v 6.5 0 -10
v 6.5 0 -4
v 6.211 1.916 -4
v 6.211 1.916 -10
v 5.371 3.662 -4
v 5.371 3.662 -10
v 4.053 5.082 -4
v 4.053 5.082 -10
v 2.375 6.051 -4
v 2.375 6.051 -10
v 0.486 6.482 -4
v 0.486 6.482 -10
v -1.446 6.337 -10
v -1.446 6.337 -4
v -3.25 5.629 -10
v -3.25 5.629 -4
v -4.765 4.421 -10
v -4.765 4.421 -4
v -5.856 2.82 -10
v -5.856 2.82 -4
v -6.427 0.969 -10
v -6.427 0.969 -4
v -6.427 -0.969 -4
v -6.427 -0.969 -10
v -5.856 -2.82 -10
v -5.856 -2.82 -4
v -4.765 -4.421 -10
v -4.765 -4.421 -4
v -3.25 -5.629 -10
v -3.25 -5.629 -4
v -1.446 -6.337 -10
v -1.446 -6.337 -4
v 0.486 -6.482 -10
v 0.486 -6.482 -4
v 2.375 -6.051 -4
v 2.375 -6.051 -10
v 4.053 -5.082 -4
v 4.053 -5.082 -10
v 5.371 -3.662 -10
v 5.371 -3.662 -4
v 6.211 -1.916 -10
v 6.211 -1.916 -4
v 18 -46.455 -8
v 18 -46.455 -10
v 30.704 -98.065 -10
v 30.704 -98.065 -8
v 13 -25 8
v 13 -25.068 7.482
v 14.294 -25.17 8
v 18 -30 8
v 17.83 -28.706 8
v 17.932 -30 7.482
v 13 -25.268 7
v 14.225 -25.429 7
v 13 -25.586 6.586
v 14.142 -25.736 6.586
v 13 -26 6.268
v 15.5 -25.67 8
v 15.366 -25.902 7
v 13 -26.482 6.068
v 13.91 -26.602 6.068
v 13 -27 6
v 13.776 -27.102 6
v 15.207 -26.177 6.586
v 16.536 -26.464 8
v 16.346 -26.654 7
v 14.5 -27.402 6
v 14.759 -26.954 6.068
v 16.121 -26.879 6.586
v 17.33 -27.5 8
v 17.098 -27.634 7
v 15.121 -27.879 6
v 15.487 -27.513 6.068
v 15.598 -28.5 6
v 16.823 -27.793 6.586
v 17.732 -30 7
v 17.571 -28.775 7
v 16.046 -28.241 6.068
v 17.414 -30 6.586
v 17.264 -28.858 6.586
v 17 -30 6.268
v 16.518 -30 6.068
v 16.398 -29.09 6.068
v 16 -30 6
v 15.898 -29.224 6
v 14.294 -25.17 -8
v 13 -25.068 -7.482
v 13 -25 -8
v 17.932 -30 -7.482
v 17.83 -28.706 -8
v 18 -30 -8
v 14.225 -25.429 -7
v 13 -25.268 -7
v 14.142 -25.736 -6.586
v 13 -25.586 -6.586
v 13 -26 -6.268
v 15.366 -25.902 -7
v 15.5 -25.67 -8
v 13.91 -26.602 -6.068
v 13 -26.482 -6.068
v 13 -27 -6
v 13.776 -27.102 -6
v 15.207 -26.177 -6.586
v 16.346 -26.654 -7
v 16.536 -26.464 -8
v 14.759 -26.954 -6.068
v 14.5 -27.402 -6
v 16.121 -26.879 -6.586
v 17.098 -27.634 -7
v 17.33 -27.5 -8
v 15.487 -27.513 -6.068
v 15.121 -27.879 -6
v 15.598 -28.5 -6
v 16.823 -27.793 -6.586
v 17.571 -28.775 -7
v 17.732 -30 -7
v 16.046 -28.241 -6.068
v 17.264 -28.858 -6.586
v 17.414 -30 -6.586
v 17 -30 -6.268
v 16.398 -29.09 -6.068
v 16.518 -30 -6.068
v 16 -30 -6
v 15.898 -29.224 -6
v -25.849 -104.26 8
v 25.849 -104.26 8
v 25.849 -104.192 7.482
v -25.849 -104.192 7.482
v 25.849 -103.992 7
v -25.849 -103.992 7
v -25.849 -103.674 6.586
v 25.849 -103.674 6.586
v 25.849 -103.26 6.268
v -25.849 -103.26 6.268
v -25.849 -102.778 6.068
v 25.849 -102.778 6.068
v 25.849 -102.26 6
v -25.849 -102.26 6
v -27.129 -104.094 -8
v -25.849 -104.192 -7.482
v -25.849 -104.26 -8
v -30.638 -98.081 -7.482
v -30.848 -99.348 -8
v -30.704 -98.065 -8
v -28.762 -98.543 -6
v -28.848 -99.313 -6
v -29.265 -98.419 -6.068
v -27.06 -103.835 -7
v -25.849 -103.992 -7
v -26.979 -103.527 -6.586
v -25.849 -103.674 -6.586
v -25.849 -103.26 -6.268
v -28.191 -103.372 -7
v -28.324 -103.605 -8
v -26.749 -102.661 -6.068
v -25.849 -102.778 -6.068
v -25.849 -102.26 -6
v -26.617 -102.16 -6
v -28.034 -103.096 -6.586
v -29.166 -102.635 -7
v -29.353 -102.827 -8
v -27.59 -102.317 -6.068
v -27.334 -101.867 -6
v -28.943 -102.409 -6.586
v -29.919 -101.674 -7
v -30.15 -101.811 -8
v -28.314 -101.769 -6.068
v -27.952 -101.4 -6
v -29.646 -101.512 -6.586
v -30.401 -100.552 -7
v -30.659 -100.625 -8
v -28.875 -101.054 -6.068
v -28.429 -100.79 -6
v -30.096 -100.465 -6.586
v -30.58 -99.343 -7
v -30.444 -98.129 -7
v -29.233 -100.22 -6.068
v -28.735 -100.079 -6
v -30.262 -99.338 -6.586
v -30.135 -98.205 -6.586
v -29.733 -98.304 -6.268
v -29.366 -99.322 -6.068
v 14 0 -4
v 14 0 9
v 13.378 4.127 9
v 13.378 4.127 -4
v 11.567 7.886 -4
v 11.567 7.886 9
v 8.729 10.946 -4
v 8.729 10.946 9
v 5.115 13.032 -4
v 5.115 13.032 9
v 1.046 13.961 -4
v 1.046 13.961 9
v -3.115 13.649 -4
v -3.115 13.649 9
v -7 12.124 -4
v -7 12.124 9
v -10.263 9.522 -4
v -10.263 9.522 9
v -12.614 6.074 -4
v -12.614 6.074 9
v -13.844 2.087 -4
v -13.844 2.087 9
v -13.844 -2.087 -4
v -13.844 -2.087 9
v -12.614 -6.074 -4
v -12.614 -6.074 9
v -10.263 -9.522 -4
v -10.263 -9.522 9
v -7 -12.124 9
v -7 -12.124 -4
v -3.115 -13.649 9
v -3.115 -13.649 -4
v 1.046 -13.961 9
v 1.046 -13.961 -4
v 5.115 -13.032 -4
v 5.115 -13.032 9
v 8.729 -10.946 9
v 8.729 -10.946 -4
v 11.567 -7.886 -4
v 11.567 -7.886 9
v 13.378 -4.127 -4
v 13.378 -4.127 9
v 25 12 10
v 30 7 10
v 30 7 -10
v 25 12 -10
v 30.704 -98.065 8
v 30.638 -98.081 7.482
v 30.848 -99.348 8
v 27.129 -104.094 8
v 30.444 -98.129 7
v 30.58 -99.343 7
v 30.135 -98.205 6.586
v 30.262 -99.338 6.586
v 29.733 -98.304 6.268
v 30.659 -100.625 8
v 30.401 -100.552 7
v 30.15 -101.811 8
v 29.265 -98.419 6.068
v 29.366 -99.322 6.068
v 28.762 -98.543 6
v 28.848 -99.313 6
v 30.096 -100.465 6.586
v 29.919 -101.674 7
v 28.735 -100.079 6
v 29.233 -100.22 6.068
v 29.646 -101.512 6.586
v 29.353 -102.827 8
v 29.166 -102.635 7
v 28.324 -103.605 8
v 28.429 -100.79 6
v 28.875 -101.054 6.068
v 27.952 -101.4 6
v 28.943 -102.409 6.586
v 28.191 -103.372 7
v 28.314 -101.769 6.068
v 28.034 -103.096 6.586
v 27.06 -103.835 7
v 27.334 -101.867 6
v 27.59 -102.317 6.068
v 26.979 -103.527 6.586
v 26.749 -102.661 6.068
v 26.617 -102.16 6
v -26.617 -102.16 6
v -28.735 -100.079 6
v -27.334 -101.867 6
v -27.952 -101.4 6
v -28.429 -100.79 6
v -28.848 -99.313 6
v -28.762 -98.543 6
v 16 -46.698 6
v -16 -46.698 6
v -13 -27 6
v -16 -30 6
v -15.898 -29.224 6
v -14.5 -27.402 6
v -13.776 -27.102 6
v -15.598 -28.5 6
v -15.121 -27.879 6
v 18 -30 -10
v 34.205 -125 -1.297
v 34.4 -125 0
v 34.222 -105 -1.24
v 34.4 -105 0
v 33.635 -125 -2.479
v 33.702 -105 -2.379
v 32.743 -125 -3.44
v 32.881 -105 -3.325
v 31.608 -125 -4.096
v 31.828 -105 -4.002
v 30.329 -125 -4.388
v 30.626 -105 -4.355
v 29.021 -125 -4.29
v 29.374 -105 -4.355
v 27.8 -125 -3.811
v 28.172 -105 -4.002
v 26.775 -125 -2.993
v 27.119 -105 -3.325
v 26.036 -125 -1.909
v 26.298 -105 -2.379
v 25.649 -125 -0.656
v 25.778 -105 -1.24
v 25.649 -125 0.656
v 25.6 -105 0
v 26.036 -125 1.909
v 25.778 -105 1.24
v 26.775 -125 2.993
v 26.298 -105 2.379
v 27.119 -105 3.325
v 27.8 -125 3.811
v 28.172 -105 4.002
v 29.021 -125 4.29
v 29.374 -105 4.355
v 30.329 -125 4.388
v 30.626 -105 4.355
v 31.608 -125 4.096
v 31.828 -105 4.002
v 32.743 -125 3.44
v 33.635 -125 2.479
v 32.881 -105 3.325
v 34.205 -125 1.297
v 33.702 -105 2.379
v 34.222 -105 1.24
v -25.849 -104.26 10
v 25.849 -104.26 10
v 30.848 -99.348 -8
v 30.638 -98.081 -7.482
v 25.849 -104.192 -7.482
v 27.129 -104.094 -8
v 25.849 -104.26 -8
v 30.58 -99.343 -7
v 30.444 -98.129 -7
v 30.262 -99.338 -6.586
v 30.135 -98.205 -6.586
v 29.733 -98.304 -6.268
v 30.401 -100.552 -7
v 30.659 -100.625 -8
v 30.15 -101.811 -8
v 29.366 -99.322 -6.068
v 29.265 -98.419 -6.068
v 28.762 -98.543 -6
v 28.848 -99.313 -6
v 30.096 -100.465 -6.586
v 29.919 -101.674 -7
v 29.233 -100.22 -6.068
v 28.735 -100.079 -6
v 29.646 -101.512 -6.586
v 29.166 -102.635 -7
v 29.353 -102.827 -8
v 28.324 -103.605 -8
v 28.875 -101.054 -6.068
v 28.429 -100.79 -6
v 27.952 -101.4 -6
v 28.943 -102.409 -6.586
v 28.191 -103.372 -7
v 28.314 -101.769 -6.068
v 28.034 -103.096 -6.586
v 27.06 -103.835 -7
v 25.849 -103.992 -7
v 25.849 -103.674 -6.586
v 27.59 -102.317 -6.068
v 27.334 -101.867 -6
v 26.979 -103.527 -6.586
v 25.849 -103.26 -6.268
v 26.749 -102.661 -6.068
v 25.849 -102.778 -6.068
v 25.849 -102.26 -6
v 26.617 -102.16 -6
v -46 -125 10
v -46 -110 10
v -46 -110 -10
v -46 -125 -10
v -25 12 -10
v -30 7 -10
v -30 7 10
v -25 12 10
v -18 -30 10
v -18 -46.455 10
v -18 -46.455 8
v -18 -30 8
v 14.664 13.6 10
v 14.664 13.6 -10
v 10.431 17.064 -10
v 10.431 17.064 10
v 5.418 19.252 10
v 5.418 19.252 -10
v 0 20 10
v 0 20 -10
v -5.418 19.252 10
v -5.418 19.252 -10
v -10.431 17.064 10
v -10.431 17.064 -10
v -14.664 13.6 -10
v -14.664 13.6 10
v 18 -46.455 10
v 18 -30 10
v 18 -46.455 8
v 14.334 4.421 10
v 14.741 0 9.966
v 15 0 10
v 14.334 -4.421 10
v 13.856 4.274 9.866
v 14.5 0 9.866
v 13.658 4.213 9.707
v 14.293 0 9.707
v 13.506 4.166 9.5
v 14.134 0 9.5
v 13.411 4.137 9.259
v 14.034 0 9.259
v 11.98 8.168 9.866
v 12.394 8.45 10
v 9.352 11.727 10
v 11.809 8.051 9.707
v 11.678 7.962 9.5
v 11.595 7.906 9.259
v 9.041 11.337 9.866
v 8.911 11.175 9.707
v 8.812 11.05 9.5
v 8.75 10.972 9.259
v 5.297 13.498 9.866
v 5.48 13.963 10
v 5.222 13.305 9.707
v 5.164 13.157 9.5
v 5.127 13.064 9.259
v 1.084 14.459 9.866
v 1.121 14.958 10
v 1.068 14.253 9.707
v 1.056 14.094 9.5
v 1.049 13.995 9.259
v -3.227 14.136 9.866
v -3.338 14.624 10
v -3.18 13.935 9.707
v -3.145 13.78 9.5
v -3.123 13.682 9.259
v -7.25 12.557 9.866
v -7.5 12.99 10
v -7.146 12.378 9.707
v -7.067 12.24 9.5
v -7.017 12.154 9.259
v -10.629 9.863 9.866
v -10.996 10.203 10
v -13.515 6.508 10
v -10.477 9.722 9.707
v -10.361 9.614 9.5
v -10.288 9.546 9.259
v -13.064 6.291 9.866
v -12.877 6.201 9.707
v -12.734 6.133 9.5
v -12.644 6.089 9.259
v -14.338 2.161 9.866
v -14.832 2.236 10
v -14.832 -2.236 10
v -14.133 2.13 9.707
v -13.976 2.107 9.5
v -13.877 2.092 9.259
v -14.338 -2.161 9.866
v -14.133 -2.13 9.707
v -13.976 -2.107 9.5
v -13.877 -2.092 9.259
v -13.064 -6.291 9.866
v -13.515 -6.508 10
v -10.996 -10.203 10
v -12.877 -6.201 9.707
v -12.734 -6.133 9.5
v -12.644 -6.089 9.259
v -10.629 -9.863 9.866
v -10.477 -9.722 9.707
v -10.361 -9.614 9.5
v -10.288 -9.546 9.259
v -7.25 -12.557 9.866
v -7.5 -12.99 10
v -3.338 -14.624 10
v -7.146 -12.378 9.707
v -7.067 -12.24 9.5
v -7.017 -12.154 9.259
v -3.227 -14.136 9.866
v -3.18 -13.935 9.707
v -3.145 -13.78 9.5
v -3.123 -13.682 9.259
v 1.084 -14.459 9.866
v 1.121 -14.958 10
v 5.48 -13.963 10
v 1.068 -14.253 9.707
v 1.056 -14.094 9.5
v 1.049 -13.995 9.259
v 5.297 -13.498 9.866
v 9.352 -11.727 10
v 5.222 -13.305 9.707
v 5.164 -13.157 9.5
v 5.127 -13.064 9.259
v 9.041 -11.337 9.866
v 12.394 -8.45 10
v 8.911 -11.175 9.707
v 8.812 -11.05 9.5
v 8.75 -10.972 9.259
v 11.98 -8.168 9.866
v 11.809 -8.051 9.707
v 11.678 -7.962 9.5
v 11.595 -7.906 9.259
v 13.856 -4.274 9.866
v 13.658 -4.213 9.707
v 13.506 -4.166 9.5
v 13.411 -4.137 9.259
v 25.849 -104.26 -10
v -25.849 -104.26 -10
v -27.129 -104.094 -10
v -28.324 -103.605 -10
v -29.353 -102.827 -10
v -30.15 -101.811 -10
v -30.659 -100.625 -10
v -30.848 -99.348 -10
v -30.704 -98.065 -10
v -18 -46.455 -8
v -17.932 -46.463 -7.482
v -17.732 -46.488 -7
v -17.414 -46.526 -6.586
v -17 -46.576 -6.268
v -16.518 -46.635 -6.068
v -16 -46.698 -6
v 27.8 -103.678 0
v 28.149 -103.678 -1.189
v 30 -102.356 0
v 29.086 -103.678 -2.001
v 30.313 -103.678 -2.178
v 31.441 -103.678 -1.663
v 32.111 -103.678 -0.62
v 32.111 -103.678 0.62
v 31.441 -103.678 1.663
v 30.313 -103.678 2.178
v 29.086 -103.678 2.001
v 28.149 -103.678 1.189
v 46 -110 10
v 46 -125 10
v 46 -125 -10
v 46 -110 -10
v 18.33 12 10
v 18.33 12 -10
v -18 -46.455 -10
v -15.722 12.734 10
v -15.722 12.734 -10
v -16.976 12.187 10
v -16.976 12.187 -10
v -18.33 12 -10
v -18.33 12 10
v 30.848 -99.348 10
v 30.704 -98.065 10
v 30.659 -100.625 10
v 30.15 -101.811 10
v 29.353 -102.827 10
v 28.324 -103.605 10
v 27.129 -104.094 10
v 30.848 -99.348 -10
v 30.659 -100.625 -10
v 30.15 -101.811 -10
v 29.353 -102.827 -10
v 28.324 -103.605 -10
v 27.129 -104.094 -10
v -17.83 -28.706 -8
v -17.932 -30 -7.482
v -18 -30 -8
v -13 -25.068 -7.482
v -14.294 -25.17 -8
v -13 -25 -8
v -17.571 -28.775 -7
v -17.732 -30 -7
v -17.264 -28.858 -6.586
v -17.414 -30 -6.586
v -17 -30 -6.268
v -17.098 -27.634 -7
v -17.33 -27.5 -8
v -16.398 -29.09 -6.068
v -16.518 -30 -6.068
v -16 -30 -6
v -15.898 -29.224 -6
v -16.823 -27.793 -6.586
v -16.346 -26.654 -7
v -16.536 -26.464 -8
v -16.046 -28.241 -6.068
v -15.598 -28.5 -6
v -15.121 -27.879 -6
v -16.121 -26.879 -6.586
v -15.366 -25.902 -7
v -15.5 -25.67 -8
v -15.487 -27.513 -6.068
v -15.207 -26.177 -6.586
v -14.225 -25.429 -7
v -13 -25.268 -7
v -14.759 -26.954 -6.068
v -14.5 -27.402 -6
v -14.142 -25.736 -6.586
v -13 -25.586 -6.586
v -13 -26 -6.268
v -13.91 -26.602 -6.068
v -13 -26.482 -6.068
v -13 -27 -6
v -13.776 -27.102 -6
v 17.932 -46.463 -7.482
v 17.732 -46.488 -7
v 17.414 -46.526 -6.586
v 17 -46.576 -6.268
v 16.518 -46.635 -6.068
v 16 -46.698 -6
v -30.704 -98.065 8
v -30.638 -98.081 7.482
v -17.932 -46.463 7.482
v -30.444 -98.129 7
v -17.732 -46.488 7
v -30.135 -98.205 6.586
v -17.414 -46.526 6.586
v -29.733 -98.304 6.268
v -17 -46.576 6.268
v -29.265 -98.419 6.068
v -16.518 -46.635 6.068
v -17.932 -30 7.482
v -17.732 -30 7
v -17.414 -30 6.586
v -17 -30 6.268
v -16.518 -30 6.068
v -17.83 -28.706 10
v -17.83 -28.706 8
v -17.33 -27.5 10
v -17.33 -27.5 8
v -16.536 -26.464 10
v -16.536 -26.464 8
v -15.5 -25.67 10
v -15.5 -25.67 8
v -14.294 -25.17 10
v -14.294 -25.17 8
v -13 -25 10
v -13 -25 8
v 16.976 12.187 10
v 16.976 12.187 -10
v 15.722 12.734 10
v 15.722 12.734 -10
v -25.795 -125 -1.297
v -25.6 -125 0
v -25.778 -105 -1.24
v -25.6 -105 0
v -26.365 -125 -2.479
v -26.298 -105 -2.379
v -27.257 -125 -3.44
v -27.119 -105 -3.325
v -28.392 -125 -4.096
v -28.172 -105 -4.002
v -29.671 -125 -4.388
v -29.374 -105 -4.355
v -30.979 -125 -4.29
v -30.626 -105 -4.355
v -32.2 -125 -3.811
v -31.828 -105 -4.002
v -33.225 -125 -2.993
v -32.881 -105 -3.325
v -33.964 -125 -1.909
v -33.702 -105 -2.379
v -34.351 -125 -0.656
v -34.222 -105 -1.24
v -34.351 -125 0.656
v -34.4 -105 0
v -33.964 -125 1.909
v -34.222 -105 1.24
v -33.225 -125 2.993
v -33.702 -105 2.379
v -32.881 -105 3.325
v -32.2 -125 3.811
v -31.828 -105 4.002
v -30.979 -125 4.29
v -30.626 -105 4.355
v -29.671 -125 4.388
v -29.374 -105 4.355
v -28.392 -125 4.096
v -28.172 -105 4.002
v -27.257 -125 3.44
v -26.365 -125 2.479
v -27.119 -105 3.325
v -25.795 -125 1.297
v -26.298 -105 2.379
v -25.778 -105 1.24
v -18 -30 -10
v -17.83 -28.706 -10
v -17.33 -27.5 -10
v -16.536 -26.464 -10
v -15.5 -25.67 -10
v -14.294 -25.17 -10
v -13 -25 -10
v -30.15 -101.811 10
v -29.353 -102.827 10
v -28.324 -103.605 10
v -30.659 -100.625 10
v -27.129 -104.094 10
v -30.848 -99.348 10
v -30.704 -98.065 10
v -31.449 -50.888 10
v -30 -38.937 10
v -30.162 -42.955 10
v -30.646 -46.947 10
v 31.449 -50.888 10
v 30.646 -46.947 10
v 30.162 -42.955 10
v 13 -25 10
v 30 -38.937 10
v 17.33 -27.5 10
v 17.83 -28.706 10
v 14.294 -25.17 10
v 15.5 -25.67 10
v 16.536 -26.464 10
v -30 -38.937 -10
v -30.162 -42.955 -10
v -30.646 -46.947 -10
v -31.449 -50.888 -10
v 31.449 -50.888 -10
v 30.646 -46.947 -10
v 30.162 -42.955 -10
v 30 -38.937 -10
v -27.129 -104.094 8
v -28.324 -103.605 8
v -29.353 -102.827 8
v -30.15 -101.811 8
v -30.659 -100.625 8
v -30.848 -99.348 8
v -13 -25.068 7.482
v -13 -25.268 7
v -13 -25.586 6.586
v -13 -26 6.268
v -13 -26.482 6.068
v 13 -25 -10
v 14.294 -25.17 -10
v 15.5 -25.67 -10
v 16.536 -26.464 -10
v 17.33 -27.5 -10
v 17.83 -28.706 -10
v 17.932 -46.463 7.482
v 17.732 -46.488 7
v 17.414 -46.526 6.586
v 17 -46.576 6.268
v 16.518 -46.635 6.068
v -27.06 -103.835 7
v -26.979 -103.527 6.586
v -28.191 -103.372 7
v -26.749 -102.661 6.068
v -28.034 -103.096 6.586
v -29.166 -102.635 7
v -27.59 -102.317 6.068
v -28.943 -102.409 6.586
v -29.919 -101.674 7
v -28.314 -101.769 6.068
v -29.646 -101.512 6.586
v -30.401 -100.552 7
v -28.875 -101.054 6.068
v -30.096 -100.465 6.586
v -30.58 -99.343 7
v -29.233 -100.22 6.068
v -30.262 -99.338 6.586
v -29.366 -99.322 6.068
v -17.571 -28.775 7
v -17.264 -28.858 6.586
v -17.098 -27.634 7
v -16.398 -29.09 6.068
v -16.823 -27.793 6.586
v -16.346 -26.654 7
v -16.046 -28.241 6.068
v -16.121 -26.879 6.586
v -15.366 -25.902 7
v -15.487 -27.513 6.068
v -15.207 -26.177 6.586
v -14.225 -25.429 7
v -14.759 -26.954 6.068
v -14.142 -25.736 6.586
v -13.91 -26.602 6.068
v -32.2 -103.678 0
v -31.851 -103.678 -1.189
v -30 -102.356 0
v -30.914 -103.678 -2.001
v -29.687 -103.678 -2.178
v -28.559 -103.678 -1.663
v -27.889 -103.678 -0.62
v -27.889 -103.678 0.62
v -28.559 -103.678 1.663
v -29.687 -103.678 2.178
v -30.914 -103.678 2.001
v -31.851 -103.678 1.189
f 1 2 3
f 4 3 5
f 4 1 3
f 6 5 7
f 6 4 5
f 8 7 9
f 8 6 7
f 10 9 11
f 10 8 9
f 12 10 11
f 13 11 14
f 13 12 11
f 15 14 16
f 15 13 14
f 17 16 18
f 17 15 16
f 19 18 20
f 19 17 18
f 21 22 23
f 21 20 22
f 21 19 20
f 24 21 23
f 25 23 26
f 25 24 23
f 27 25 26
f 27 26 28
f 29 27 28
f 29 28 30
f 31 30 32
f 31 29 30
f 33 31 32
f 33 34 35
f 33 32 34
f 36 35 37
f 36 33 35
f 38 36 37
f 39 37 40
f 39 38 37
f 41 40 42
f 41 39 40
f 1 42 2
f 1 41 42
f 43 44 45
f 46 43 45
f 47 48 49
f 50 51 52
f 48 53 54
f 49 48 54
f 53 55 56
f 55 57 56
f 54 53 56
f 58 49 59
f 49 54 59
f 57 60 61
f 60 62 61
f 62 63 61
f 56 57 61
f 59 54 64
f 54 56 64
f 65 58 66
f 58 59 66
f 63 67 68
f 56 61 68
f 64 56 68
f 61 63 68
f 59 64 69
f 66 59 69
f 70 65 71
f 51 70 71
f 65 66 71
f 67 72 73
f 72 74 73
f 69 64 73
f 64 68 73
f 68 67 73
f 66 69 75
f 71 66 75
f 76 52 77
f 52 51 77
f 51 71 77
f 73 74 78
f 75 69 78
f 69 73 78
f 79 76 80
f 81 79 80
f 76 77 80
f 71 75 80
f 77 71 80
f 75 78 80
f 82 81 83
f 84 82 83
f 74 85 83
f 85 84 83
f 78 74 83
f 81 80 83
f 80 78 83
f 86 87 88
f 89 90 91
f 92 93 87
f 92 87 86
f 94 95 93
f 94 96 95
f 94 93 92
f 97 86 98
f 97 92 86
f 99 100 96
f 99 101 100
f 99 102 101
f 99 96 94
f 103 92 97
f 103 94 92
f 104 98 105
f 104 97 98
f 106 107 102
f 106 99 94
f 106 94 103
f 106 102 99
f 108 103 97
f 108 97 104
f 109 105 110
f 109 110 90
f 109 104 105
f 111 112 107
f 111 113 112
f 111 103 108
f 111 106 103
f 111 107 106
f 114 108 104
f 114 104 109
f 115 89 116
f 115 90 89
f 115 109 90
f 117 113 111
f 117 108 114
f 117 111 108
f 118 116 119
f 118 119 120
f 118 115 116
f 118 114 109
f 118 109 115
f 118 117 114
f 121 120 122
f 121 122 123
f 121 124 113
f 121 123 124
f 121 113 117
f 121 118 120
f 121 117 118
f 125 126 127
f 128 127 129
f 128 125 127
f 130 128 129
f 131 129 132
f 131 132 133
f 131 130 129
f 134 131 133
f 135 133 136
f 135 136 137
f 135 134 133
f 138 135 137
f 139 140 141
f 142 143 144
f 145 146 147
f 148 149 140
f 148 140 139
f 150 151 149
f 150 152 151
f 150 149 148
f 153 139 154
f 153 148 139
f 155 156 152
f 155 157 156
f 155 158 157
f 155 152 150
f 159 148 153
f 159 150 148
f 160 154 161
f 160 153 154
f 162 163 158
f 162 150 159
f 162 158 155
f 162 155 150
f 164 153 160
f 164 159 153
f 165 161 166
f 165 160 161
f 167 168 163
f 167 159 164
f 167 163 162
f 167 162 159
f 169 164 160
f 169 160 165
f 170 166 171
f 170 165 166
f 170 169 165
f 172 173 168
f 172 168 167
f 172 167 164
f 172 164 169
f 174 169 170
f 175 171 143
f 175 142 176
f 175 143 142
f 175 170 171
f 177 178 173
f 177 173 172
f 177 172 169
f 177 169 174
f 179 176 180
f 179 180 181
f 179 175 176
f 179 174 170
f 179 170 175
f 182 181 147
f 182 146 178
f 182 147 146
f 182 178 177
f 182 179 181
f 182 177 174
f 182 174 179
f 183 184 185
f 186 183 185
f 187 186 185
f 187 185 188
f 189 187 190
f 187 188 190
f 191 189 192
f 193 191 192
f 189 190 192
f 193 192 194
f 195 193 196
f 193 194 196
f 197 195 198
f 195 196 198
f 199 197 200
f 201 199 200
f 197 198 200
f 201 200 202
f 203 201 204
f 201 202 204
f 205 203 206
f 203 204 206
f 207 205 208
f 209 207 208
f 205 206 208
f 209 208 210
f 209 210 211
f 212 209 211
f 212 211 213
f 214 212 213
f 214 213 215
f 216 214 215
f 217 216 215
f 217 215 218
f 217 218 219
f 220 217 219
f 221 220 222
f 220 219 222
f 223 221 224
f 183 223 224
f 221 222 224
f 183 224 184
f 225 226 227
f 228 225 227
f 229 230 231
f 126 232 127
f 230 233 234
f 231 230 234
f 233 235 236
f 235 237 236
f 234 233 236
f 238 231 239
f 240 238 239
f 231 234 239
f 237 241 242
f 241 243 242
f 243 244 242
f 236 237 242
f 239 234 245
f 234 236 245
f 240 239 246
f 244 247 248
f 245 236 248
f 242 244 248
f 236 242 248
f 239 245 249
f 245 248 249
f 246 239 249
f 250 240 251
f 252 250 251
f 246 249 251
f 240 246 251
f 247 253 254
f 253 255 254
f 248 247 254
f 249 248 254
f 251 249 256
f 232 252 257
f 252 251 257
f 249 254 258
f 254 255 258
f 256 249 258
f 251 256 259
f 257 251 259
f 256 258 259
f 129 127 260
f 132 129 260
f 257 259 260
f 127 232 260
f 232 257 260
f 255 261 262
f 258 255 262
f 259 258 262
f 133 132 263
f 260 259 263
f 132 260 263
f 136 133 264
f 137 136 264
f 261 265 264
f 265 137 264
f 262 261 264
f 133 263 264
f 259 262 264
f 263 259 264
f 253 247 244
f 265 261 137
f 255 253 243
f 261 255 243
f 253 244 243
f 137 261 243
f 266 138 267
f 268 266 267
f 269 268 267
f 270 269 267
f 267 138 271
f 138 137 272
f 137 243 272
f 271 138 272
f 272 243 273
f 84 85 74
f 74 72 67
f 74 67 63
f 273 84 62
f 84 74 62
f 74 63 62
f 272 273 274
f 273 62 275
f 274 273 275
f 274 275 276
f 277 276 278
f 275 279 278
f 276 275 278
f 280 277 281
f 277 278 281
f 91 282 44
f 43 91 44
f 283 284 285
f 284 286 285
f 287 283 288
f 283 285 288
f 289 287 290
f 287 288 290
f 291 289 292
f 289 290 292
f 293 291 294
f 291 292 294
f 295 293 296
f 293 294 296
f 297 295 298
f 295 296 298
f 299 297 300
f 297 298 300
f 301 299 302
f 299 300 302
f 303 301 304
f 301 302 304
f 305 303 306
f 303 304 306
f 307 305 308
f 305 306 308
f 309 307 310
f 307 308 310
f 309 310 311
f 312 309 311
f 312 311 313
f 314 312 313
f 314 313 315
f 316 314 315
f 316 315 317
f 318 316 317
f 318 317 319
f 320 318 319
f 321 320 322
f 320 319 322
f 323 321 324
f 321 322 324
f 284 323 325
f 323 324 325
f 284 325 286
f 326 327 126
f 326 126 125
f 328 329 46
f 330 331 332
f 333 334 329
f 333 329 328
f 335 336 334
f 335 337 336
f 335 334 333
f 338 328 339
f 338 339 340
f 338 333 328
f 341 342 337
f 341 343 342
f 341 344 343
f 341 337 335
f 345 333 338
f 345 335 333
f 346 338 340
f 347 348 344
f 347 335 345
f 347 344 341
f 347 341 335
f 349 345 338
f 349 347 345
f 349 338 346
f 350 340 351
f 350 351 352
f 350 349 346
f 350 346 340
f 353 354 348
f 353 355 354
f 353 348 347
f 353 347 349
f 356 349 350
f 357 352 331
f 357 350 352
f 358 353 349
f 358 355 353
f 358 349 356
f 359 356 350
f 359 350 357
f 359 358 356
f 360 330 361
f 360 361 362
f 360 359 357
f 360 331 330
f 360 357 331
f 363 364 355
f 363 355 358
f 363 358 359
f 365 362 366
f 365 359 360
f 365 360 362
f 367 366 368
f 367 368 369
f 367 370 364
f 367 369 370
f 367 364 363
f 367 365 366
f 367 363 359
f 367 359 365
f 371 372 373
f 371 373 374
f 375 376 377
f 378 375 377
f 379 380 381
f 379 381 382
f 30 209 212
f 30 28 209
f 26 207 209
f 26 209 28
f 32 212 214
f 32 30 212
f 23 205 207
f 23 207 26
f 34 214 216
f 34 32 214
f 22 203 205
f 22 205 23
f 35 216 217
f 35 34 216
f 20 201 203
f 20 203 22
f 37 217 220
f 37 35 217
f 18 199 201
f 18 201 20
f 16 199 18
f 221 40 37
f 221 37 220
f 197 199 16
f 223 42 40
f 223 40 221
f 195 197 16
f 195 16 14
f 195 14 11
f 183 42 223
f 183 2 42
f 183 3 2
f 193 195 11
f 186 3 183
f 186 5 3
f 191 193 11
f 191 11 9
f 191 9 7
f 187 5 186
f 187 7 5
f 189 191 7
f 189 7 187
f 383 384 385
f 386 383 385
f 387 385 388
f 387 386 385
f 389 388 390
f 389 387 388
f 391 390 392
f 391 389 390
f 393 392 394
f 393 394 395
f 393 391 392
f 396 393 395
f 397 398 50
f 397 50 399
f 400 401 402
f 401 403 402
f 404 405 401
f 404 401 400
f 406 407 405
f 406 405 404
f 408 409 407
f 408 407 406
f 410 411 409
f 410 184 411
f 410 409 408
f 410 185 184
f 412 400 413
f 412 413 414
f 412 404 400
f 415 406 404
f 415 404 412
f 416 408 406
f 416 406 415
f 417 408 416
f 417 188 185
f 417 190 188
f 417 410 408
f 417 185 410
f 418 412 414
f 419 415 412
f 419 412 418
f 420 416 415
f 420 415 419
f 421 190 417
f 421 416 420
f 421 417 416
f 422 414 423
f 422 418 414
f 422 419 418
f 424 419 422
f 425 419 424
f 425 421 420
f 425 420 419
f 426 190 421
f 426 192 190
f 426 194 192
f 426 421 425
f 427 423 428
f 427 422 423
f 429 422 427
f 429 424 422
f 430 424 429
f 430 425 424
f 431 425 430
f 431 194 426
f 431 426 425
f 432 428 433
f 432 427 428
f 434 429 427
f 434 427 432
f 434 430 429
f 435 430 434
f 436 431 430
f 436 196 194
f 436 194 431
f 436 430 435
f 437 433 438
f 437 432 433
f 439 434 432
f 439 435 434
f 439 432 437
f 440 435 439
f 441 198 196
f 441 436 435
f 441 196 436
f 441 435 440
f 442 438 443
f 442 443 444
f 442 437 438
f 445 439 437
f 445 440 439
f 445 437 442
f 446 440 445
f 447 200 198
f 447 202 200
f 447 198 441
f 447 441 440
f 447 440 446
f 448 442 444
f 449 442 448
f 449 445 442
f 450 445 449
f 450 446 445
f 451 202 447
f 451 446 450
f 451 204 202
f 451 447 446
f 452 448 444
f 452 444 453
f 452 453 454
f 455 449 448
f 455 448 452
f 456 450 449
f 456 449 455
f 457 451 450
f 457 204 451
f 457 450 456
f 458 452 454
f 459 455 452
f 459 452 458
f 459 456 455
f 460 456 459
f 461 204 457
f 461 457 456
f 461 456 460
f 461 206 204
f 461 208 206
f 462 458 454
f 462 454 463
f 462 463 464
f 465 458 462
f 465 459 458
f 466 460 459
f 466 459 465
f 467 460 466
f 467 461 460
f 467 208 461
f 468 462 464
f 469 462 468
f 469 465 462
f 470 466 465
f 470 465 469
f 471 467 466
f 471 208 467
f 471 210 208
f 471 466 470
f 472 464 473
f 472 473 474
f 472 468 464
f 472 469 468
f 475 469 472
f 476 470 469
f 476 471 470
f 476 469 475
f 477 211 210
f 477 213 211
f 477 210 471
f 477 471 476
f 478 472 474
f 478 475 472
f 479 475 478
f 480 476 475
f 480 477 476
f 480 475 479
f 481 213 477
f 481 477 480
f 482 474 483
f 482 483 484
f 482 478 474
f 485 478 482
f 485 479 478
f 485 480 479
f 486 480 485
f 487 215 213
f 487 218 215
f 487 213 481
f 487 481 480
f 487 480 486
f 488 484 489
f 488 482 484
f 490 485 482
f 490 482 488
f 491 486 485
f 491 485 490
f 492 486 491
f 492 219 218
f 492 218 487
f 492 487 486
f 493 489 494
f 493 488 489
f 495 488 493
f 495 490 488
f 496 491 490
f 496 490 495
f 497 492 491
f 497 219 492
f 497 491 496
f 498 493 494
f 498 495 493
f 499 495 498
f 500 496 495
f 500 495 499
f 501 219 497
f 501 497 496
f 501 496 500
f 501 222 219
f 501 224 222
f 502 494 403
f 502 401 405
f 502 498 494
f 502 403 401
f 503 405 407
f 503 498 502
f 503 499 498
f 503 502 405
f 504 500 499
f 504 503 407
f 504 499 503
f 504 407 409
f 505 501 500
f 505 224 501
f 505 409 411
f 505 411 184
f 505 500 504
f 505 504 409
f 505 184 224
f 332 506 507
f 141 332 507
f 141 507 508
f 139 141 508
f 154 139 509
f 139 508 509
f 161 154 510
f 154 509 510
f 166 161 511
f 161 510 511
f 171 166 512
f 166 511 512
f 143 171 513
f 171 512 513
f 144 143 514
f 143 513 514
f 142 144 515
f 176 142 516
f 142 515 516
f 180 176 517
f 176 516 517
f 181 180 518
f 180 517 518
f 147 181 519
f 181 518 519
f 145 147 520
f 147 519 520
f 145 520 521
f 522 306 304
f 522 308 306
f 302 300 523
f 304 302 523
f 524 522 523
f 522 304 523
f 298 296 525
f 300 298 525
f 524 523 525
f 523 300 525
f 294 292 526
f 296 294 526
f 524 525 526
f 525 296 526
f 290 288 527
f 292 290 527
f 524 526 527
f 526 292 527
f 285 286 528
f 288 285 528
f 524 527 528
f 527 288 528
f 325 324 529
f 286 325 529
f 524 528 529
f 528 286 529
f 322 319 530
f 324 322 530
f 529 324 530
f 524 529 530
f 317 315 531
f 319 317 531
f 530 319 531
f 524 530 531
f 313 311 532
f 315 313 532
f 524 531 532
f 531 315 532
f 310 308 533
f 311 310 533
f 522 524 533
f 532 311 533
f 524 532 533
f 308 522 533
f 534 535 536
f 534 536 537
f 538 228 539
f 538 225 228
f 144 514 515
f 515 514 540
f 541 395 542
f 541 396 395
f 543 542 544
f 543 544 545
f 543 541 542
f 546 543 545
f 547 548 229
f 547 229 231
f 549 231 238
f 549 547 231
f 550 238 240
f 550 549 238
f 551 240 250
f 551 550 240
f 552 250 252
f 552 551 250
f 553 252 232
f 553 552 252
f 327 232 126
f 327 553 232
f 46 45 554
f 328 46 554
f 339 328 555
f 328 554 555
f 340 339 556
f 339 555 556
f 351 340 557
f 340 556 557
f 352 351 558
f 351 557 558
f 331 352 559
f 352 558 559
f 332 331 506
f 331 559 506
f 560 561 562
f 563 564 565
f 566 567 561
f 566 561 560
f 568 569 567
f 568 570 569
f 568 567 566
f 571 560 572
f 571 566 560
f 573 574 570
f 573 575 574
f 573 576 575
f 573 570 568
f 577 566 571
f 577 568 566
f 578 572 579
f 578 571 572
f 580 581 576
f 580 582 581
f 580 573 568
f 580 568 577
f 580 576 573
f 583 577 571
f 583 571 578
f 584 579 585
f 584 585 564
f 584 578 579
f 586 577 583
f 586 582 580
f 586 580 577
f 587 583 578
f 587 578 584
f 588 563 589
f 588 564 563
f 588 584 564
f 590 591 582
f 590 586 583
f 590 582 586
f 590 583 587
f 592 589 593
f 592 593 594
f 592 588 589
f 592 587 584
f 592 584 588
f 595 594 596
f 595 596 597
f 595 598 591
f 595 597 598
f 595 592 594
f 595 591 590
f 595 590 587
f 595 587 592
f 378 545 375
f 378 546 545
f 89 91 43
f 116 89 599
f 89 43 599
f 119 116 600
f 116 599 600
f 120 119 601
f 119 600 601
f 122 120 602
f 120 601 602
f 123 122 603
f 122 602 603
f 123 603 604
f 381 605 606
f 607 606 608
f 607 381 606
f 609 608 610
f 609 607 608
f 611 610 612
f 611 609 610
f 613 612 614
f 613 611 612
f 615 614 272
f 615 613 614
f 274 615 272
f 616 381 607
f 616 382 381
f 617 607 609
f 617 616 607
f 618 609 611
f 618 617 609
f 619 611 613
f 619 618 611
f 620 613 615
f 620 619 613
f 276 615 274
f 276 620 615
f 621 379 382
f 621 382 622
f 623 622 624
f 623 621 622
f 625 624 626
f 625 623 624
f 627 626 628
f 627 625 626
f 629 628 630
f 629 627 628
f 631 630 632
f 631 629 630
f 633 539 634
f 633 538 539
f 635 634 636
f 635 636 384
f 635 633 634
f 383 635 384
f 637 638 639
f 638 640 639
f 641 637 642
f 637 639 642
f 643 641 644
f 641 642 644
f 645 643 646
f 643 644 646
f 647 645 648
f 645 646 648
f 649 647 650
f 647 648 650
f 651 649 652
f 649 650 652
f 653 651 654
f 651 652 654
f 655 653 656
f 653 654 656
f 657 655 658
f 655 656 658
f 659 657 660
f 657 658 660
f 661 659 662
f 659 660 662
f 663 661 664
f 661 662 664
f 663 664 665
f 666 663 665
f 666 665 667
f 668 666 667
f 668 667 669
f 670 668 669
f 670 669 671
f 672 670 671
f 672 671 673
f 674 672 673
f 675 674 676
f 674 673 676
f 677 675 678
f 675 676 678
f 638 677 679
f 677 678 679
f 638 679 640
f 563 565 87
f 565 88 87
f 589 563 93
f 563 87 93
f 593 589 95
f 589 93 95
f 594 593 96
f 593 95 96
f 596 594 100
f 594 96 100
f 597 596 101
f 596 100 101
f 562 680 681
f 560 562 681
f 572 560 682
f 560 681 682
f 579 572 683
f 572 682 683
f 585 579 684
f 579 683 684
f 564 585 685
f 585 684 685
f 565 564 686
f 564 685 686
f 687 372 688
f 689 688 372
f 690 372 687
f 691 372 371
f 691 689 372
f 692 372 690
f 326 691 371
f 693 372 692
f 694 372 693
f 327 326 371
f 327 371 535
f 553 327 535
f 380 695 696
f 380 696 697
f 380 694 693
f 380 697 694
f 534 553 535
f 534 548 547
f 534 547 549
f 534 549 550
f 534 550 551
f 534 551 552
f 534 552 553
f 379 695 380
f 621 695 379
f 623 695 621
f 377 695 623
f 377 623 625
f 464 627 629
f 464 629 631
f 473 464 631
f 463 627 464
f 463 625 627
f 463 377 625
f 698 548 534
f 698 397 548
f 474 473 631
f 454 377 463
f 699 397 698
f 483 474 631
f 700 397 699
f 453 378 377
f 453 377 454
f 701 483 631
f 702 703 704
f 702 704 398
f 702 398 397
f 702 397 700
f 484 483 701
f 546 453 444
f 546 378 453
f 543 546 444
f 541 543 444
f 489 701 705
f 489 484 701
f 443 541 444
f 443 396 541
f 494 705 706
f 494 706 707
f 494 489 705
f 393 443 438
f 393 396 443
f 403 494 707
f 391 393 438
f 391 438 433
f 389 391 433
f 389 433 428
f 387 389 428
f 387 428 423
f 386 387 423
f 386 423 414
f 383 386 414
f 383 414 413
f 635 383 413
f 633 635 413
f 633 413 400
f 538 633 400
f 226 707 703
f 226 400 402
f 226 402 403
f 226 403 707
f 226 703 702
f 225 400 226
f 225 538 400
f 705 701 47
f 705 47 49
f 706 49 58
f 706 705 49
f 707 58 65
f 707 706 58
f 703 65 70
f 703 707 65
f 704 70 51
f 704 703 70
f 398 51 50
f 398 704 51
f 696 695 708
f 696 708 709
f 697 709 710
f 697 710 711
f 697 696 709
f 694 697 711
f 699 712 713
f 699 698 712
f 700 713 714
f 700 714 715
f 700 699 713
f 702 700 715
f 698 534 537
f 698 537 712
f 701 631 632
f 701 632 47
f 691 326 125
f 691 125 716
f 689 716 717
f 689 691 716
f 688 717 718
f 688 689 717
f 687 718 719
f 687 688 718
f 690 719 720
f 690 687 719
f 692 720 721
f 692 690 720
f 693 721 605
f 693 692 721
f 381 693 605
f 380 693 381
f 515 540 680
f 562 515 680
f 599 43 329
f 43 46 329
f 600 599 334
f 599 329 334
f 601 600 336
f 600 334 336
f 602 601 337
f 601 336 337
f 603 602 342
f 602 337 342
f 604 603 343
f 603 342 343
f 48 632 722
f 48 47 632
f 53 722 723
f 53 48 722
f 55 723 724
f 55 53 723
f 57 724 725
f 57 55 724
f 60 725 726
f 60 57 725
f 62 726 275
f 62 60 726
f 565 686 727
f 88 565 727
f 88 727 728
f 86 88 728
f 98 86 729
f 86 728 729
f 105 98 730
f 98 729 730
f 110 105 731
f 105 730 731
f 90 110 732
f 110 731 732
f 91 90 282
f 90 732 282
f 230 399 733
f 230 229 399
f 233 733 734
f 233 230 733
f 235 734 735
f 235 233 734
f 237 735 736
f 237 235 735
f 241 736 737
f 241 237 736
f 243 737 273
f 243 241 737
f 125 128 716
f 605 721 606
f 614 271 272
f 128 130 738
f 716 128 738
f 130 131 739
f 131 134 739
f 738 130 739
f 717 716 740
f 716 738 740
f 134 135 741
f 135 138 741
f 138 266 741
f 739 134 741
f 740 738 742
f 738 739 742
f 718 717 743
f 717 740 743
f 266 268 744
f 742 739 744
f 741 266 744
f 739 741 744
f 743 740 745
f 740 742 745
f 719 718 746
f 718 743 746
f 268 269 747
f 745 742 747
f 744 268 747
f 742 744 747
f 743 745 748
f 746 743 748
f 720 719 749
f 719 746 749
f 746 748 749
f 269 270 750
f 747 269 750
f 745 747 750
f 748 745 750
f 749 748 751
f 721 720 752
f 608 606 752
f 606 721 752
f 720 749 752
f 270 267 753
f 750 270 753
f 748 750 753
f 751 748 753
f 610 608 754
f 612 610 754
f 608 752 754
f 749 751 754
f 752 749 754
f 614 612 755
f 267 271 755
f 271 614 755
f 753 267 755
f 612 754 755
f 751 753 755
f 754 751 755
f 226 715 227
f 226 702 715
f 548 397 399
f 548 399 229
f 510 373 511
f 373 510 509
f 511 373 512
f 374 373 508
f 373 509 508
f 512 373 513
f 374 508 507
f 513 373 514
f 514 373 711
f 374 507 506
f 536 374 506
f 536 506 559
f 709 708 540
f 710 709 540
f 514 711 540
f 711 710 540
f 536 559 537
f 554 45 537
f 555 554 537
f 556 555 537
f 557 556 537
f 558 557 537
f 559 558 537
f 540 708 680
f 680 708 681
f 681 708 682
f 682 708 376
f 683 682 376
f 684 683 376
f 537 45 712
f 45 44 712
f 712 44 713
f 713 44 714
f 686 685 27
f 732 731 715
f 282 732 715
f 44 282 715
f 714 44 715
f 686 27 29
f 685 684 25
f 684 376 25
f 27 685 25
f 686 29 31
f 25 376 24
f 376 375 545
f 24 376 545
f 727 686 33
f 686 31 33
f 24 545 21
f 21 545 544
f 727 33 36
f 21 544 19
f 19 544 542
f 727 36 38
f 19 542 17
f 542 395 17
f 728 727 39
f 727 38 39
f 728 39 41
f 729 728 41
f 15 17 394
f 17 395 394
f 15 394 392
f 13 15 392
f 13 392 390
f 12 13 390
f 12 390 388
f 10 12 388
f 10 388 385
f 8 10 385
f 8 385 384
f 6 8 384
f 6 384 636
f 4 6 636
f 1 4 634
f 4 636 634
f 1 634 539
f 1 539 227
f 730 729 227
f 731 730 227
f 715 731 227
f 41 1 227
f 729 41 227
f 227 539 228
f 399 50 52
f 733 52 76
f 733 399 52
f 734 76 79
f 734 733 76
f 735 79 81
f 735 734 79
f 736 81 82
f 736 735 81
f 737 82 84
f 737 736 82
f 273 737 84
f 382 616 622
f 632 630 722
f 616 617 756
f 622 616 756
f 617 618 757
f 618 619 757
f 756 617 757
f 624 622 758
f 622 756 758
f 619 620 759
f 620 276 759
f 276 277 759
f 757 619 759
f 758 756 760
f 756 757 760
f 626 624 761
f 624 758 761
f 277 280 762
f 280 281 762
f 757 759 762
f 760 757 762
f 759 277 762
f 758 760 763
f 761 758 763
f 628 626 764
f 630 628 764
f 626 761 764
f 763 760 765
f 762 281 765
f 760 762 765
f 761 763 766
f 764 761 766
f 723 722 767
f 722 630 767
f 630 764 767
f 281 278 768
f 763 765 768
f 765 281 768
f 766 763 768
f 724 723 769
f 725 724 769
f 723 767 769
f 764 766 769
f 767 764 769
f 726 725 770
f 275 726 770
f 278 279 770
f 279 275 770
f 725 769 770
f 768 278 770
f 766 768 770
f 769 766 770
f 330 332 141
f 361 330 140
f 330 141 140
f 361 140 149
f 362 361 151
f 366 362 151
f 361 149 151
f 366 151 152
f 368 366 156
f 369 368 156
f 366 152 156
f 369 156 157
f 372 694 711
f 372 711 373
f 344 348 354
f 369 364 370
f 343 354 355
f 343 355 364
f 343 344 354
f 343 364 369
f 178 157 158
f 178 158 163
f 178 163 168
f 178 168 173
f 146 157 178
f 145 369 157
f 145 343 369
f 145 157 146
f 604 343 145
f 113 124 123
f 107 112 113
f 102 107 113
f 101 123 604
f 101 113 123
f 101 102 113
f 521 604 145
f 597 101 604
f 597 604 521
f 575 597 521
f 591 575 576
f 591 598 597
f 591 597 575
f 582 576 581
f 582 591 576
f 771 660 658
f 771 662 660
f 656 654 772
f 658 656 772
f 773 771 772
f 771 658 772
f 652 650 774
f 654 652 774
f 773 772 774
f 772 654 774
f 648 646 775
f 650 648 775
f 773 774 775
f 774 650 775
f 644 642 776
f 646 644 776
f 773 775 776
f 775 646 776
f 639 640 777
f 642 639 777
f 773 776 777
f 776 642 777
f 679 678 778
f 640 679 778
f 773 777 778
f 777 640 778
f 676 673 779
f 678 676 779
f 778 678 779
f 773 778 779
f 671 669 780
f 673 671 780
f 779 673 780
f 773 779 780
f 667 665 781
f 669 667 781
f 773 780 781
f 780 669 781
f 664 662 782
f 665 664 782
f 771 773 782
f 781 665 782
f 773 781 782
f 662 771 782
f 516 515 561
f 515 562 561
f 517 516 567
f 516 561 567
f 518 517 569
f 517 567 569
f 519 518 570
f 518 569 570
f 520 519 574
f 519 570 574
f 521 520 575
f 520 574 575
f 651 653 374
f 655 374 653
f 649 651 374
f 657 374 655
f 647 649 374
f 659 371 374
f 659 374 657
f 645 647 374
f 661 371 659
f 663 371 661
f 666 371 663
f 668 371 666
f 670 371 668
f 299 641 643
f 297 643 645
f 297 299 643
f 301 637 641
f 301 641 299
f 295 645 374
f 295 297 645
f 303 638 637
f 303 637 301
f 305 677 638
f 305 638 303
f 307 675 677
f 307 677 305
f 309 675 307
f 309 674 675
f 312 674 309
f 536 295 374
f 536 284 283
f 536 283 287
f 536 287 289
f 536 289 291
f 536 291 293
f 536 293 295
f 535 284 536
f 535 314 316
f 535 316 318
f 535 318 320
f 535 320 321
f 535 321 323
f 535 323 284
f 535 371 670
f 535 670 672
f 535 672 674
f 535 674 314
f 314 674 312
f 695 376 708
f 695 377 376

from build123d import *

# Parameters (mm, degrees)
SKETCH2_R                   = 6.5
BOSS_EXTRUDE1_DEPTH         = 10
M10X1_25_TAPPED_HOLE1_D     = 8.8
M10X1_25_TAPPED_HOLE1_DEPTH = 20
M10X1_25_TAPPED_HOLE1_TIP   = 2.643786724
SKETCH8_R                   = 14
CUT_EXTRUDE1_DEPTH          = 14
FILLET1_R                   = 1
CUT_EXTRUDE2_DEPTH          = 4
FILLET2_R                   = 2
FILLET2_OF_MIRROR1_R        = 2
CHAMFER1_SIZE               = 5


with BuildPart() as part:
    # Sketch2 → Boss-Extrude1 (new body, symmetric)
    with BuildSketch(Plane.XY):
        with BuildLine():
            Line((-18.33030278, 12), (-30, 12))
            Line((-30, 12), (-30, -38.93665036))
            ThreePointArc((-30, -38.93665036), (-30.363636327, -44.955902916), (-31.449256053, -50.887602716))
            Line((-31.449256053, -50.887602716), (-46, -110))
            Line((-46, -110), (-46, -125))
            Line((-46, -125), (46, -125))
            Line((46, -125), (46, -110))
            Line((46, -110), (31.449256053, -50.887602716))
            ThreePointArc((31.449256053, -50.887602716), (30.363636327, -44.955902916), (30, -38.93665036))
            Line((30, -38.93665036), (30, 12))
            Line((30, 12), (18.33030278, 12))
            ThreePointArc((18.33030278, 12), (16.33030278, 12.417424305), (14.664242224, 13.6))
            ThreePointArc((14.664242224, 13.6), (0, 20), (-14.664242224, 13.6))
            ThreePointArc((-14.664242224, 13.6), (-16.33030278, 12.417424305), (-18.33030278, 12))
        make_face()
        Circle(SKETCH2_R, mode=Mode.SUBTRACT)
    extrude(amount=BOSS_EXTRUDE1_DEPTH, both=True)

    # M10x1.25 Tapped Hole1
    with Locations(Plane(origin=(0, -125, 0), x_dir=(-1, 0, 0), z_dir=(0, -1, 0))):
        with Locations((30, 0), (-30, 0)):
            Hole(M10X1_25_TAPPED_HOLE1_D / 2, depth=M10X1_25_TAPPED_HOLE1_DEPTH)
            with Locations((0, 0, -(M10X1_25_TAPPED_HOLE1_DEPTH + M10X1_25_TAPPED_HOLE1_TIP / 2))):  # 118° drill point
                Cone(0, M10X1_25_TAPPED_HOLE1_D / 2, M10X1_25_TAPPED_HOLE1_TIP, mode=Mode.SUBTRACT)

    # Sketch8 → Cut-Extrude1 (cut)
    with BuildSketch(Plane.XY.offset(10)):
        Circle(SKETCH8_R)
    extrude(amount=-CUT_EXTRUDE1_DEPTH, mode=Mode.SUBTRACT)

    # Fillet1
    fillet1_edges = [part.edges().sort_by_distance(p)[0] for p in [
        (-14, 0, 10),
    ]]
    fillet(fillet1_edges, radius=FILLET1_R)

    # Sketch9 → Cut-Extrude2 (cut)
    with BuildSketch(Plane.XY.offset(10)):
        with BuildLine():
            Line((-30.703970126, -98.065082549), (-18, -46.455203914))
            Line((-18, -46.455203914), (-18, -30))
            ThreePointArc((-18, -30), (-16.535533906, -26.464466094), (-13, -25))
            Line((-13, -25), (13, -25))
            ThreePointArc((13, -25), (16.535533906, -26.464466094), (18, -30))
            Line((18, -30), (18, -46.455203914))
            Line((18, -46.455203914), (30.703970126, -98.065082549))
            ThreePointArc((30.703970126, -98.065082549), (29.784342096, -102.344373289), (25.848895731, -104.260177784))
            Line((25.848895731, -104.260177784), (-25.848895731, -104.260177784))
            ThreePointArc((-25.848895731, -104.260177784), (-29.784342096, -102.344373289), (-30.703970126, -98.065082549))
        make_face()
    cut_extrude2 = extrude(amount=-CUT_EXTRUDE2_DEPTH, mode=Mode.SUBTRACT)

    # Fillet2
    fillet2_edges = [part.edges().sort_by_distance(p)[0] for p in [
        (-18, -38.227601957, 6),
        (-16.535533906, -26.464466094, 6),
        (0, -25, 6),
        (16.535533906, -26.464466094, 6),
        (18, -38.227601957, 6),
        (24.351985063, -72.260143231, 6),
        (29.784342096, -102.344373289, 6),
        (0, -104.260177784, 6),
        (-29.784342096, -102.344373289, 6),
        (-24.351985063, -72.260143231, 6),
    ]]
    fillet(fillet2_edges, radius=FILLET2_R)

    # Mirror1: Cut-Extrude2 across plane
    add(cut_extrude2.mirror(Plane.XY), mode=Mode.SUBTRACT)

    # Fillet2 of Mirror1
    fillet2_of_mirror1_edges = [part.edges().sort_by_distance(p)[0] for p in [
        (-18, -38.227601957, -6),
        (-16.535533906, -26.464466094, -6),
        (0, -25, -6),
        (16.535533906, -26.464466094, -6),
        (18, -38.227601957, -6),
        (24.351985063, -72.260143231, -6),
        (29.784342096, -102.344373289, -6),
        (0, -104.260177784, -6),
        (-29.784342096, -102.344373289, -6),
        (-24.351985063, -72.260143231, -6),
    ]]
    fillet(fillet2_of_mirror1_edges, radius=FILLET2_OF_MIRROR1_R)

    # Chamfer1
    chamfer1_edges = [part.edges().sort_by_distance(p)[0] for p in [
        (30, 12, 0),
        (-30, 12, 0),
    ]]
    chamfer(chamfer1_edges, length=CHAMFER1_SIZE)


solid = part.part
